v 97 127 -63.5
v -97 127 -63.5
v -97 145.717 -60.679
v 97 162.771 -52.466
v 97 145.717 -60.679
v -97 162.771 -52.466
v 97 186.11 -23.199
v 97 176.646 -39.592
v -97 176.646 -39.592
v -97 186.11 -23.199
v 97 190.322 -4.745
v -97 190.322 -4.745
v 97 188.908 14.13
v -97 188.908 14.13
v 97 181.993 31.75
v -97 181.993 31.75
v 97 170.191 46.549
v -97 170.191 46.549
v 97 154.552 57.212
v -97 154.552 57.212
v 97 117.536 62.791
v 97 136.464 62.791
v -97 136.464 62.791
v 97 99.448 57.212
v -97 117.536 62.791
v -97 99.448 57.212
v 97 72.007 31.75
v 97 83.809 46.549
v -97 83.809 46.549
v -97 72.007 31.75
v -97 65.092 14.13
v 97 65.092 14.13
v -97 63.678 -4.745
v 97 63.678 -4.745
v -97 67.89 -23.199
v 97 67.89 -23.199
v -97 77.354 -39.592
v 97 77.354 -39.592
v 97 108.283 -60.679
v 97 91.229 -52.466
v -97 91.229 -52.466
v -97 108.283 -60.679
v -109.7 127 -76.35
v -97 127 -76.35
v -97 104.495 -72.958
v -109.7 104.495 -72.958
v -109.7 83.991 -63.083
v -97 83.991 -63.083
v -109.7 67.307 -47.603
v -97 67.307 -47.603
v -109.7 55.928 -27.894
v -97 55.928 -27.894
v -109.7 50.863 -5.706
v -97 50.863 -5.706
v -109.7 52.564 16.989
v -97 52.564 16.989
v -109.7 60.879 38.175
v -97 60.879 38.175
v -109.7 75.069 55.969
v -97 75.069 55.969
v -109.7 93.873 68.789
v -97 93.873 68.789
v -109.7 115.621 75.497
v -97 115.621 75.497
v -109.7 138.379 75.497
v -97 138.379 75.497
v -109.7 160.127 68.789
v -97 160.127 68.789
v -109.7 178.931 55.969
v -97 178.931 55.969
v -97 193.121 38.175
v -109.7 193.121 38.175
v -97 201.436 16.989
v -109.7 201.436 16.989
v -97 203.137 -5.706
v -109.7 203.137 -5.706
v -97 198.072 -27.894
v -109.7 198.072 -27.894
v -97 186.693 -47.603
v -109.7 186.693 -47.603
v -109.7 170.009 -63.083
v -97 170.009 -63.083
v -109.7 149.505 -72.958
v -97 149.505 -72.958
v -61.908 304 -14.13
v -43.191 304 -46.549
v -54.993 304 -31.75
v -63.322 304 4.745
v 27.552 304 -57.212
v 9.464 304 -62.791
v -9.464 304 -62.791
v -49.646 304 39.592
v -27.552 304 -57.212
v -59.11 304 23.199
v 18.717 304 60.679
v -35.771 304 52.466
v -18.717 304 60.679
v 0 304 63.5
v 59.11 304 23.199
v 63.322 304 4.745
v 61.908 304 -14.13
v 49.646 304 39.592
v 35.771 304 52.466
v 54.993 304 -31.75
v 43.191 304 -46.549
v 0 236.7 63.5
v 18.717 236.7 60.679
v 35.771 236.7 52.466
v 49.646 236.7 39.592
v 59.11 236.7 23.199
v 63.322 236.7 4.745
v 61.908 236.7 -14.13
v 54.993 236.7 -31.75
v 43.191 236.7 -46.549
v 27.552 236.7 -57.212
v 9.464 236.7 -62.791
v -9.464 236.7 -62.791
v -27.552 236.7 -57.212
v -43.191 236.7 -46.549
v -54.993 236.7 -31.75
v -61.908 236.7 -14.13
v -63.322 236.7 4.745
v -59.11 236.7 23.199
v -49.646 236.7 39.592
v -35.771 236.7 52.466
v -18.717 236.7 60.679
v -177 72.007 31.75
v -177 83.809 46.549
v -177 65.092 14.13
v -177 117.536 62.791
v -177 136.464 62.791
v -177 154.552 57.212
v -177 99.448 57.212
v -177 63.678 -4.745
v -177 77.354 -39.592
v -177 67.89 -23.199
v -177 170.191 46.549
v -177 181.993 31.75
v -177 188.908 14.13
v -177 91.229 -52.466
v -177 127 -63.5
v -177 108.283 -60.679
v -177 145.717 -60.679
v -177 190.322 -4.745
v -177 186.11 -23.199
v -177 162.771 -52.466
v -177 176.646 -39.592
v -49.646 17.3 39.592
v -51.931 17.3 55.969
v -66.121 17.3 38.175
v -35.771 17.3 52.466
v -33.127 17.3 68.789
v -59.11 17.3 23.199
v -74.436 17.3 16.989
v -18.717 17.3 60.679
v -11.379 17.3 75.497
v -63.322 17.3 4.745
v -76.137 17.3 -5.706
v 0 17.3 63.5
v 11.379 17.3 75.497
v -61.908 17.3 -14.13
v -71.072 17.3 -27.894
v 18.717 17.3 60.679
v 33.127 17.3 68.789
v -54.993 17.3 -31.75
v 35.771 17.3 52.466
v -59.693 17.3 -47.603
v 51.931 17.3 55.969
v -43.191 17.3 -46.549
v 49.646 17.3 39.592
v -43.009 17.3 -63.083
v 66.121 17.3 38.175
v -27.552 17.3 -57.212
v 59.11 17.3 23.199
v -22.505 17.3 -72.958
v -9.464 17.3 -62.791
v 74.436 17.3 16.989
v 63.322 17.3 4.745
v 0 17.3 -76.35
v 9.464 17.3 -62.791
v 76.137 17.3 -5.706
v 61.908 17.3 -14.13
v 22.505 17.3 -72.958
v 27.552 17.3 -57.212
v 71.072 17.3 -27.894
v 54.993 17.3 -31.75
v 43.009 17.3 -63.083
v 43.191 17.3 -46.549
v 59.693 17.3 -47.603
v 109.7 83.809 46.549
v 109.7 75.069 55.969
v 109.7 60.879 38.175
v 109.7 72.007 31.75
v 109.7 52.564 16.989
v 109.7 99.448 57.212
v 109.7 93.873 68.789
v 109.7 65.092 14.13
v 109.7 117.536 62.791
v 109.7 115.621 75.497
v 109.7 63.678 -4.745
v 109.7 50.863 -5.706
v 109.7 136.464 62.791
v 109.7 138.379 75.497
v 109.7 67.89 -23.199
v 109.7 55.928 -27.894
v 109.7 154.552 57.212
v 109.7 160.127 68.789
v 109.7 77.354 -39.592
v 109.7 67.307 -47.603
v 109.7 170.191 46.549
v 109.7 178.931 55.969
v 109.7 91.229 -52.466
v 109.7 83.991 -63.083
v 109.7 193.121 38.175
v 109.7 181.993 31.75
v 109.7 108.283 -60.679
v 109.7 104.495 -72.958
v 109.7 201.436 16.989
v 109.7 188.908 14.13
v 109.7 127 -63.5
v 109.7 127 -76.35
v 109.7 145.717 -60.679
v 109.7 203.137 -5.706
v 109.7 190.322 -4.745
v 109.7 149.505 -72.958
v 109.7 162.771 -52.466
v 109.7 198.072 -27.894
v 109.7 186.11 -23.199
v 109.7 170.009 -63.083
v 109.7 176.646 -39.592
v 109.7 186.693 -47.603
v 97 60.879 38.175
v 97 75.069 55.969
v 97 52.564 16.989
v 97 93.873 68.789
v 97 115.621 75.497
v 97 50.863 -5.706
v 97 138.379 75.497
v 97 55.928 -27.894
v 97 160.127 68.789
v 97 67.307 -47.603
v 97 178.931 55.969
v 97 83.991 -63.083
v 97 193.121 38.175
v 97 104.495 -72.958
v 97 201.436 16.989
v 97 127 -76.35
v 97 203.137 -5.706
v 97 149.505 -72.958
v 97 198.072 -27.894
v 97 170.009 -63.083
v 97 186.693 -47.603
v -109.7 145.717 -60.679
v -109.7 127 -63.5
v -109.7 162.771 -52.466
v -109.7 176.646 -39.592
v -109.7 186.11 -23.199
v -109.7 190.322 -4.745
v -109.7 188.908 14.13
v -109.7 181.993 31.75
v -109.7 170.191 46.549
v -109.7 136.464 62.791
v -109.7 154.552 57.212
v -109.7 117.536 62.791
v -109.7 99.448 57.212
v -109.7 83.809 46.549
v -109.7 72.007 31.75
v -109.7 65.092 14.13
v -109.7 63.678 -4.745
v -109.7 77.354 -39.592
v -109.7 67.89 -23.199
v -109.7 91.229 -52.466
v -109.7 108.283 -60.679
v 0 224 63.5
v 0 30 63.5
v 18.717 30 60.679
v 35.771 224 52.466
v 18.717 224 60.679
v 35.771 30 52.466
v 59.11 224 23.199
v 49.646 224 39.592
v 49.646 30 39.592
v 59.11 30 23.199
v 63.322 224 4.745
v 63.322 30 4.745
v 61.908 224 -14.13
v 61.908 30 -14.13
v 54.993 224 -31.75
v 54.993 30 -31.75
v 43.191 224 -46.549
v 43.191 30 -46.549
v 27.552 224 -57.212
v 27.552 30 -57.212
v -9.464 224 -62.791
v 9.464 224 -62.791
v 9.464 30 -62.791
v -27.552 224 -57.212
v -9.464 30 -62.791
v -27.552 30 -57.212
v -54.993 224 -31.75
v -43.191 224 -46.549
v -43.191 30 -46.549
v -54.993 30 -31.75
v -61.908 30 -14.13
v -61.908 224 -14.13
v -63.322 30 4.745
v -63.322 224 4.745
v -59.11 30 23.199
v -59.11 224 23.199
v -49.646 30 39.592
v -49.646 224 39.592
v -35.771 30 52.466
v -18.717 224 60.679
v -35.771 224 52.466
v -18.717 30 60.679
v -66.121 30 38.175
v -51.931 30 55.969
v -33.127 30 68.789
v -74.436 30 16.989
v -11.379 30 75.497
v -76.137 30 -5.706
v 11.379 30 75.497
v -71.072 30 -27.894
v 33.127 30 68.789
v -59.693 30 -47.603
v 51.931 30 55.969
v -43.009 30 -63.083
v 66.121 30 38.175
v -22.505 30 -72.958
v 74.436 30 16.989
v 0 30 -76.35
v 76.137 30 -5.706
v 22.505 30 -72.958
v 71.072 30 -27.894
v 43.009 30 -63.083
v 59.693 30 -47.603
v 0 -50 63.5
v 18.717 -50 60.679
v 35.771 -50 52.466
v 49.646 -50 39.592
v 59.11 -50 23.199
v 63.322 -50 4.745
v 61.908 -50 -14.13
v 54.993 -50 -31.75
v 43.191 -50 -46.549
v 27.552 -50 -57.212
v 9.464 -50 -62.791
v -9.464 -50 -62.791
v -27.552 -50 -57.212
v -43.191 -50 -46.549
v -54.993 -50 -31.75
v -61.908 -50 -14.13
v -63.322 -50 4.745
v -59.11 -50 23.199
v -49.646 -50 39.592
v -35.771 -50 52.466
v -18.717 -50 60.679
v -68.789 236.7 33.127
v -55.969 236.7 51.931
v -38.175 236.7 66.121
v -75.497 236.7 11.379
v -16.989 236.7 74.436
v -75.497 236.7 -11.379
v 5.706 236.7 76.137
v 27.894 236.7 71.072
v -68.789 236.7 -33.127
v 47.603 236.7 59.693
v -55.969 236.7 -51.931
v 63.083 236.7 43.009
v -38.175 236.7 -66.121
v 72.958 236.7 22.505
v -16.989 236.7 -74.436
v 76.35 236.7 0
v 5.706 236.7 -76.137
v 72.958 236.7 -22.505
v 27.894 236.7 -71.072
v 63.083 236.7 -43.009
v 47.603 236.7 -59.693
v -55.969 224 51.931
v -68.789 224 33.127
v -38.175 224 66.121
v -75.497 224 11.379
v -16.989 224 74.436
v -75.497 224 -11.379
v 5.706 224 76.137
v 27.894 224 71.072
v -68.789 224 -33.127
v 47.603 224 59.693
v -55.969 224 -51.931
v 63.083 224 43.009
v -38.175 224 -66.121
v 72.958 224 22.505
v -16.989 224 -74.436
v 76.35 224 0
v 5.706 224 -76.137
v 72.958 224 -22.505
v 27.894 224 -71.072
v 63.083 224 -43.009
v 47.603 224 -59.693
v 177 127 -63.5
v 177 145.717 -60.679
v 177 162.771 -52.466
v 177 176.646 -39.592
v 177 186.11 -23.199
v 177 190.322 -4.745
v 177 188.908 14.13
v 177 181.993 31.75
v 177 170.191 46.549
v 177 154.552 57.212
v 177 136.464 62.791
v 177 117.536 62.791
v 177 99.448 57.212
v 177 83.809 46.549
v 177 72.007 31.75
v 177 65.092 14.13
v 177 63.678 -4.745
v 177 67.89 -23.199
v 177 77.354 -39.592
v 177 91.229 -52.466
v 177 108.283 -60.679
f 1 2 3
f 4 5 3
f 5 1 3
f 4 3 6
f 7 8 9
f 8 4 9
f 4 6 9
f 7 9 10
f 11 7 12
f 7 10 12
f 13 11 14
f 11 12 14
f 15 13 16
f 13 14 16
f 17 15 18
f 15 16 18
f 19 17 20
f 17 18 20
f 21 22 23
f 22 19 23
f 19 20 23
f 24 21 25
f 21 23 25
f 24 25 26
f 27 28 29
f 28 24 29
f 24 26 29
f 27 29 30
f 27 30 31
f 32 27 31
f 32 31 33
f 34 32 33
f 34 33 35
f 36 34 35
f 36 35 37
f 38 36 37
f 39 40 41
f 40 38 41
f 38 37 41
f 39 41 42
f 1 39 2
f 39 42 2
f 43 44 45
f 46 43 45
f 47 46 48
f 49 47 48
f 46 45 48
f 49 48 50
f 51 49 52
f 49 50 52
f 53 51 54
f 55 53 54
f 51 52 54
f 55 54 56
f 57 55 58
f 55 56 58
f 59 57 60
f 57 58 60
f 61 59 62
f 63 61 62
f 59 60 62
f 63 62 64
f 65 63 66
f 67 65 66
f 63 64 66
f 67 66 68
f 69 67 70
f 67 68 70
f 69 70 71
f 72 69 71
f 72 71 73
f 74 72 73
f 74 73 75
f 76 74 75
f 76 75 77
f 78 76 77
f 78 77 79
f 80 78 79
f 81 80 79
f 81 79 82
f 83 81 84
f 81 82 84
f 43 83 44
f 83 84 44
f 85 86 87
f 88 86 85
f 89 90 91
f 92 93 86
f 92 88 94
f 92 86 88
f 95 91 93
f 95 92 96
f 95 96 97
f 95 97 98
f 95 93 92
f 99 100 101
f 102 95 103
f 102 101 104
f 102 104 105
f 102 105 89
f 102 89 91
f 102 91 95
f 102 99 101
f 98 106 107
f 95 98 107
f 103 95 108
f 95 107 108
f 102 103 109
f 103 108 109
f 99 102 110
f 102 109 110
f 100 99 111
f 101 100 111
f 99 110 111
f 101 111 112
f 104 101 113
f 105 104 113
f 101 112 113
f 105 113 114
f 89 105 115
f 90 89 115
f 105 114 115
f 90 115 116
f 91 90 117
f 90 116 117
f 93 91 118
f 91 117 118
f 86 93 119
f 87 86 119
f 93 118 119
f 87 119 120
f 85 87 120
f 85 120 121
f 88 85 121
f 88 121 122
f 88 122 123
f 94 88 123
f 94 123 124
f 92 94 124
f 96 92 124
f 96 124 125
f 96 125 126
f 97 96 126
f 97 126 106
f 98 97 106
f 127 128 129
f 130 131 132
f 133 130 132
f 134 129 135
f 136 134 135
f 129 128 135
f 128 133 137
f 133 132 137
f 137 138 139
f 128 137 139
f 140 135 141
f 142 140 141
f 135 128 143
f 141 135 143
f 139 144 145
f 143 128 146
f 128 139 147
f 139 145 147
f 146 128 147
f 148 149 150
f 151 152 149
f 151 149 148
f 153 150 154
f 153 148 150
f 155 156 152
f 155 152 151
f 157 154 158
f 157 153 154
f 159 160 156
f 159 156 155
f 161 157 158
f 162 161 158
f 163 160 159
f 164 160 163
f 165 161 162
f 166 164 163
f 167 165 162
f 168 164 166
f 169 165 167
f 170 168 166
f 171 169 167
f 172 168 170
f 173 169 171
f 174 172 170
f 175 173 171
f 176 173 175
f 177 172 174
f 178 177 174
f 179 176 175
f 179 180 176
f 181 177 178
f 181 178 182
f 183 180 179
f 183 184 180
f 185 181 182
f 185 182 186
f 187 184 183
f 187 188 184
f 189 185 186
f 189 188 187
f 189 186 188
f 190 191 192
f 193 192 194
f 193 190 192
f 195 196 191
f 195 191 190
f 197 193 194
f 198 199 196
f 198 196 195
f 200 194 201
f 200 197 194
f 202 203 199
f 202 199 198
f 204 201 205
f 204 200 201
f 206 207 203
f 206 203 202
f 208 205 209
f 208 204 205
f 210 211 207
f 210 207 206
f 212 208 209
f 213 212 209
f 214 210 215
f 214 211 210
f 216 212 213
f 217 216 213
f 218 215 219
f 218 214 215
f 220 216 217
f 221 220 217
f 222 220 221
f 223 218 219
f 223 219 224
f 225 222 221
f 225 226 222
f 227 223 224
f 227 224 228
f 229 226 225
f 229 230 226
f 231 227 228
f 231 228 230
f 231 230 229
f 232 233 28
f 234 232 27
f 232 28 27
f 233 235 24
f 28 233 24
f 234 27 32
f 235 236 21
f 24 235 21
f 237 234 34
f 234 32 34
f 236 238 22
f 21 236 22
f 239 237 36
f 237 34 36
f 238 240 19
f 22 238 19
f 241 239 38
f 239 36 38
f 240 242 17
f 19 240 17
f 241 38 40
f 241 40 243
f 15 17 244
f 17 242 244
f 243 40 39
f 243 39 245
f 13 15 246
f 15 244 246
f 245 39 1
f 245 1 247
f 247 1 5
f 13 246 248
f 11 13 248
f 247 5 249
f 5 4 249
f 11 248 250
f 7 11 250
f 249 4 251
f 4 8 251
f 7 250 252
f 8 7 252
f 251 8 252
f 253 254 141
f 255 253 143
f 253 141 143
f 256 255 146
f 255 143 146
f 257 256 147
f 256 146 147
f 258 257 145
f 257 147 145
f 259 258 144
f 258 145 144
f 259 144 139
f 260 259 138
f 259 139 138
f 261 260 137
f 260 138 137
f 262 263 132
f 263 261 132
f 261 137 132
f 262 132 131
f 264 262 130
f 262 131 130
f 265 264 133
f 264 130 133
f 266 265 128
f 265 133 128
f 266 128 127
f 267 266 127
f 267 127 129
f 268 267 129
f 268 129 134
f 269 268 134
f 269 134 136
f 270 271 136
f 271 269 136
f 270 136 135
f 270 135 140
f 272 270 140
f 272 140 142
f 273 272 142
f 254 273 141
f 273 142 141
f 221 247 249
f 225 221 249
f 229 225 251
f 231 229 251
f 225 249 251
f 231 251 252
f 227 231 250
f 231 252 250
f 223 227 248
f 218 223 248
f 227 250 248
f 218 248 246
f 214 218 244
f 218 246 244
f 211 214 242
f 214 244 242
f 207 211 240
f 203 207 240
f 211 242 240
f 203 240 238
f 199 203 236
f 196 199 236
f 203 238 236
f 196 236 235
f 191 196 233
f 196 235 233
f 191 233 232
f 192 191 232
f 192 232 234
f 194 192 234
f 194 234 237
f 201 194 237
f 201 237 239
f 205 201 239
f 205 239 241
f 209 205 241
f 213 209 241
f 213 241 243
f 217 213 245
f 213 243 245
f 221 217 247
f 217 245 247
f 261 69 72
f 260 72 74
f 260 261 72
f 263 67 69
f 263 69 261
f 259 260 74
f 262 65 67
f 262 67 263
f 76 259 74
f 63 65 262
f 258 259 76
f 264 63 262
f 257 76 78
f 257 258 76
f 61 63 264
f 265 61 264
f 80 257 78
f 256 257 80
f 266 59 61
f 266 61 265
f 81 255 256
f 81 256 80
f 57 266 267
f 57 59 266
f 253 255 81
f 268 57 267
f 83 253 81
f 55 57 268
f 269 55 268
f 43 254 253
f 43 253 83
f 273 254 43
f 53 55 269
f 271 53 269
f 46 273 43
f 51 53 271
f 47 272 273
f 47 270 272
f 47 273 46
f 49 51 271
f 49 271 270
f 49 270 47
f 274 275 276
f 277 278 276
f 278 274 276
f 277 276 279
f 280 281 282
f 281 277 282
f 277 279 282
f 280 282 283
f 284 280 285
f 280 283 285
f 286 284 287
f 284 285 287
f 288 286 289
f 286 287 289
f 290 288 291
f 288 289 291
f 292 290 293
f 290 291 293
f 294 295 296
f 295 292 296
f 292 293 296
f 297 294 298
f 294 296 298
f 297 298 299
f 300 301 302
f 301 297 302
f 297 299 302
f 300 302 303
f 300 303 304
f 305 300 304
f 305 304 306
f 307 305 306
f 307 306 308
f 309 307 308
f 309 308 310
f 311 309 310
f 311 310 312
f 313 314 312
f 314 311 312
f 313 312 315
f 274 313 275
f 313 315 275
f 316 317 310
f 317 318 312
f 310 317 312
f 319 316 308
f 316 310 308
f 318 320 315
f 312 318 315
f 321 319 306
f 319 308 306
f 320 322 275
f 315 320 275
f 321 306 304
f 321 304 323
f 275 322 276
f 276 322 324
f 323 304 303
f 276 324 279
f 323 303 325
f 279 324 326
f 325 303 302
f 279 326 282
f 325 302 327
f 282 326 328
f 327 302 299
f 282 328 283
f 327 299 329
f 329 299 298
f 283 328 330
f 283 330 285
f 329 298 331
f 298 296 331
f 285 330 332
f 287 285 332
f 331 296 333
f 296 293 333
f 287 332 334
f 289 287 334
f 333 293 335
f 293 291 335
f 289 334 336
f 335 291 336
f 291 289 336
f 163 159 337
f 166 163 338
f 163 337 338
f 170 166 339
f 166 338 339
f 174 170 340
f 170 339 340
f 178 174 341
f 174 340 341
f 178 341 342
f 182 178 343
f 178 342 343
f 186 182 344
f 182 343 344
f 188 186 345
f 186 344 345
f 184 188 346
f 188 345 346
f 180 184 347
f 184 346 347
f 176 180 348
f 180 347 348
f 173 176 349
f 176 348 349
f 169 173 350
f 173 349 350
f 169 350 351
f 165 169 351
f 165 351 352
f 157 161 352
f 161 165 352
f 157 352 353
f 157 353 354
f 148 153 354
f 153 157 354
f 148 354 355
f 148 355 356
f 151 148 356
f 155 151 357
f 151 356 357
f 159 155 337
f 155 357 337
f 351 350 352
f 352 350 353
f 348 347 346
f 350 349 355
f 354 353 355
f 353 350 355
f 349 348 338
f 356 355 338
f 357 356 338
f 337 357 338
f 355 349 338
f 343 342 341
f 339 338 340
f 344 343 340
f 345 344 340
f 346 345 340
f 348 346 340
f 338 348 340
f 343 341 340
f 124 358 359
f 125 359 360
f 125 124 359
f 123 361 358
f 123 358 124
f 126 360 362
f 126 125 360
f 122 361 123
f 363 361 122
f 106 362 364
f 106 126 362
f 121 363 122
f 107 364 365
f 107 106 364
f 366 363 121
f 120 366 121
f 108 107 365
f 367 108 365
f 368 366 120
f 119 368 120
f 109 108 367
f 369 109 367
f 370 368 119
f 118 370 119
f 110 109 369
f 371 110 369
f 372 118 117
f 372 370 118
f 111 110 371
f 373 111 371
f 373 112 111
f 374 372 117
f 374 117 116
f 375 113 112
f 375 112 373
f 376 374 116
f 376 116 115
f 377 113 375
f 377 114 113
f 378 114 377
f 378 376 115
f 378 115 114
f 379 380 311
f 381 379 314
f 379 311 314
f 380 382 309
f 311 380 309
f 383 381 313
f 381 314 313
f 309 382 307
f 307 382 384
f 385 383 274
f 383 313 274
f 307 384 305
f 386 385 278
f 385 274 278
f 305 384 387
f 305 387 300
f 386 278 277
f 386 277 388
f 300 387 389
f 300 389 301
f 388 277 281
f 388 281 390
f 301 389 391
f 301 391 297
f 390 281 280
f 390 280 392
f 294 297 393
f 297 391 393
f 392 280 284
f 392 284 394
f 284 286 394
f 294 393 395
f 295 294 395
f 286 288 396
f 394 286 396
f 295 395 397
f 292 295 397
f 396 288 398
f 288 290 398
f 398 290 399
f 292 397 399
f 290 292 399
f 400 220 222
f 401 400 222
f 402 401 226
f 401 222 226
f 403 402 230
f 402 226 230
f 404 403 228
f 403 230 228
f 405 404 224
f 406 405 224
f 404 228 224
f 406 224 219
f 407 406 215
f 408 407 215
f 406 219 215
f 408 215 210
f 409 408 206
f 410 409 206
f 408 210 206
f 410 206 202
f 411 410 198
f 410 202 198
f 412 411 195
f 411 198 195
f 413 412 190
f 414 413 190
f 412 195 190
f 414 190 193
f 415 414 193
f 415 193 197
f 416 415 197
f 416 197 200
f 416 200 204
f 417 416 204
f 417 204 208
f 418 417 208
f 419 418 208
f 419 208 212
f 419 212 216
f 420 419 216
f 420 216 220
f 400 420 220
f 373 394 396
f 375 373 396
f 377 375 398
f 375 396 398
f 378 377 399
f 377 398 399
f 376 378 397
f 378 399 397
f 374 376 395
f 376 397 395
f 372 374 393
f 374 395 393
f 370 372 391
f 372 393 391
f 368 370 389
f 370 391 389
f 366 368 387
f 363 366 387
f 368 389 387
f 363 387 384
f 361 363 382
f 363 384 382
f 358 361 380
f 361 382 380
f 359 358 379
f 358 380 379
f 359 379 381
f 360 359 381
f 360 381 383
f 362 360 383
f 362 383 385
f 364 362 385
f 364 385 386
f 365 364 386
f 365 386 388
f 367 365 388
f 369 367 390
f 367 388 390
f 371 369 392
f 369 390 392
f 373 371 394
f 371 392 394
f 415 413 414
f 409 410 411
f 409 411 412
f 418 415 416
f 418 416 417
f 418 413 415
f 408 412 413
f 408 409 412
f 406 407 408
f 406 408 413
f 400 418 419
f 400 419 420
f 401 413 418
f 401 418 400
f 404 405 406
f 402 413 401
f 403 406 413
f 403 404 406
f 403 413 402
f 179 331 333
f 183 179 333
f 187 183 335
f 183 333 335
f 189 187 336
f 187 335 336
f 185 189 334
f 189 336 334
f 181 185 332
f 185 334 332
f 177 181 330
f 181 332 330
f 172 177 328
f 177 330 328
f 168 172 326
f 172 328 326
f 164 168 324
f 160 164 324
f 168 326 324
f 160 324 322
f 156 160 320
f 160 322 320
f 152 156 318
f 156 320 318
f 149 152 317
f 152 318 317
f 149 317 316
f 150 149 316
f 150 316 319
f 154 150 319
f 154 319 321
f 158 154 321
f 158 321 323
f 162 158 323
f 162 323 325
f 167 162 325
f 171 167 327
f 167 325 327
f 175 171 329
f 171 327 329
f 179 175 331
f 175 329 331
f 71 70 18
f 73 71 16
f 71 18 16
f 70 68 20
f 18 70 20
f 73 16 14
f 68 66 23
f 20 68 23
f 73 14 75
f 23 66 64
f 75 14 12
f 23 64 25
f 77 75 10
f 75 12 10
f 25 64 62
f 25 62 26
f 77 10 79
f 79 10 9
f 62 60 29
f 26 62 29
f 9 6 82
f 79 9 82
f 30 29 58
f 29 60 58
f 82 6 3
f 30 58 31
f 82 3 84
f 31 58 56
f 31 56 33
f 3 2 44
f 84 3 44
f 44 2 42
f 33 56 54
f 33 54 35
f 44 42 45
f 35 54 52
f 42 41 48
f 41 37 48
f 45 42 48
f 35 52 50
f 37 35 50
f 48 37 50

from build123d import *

# Parameters (mm, degrees)
BOSS_EXTRUDE1_DEPTH      = 304
BOSS_EXTRUDE1_DEPTH_BACK = 50
SKETCH1_R                = 63.5
BOSS_EXTRUDE2_DEPTH      = 177
BOSS_EXTRUDE2_DEPTH_BACK = 177
BOSS_EXTRUDE3_START      = -80
SKETCH5_R                = 76.35
SKETCH5_R_2              = 63.5
BOSS_EXTRUDE3_DEPTH      = 12.7
BOSS_EXTRUDE4_START      = -80
SKETCH6_R                = 76.35
BOSS_EXTRUDE4_DEPTH      = 12.7
BOSS_EXTRUDE5_START      = -80
SKETCH7_R                = 76.35
SKETCH7_R_2              = 63.5
BOSS_EXTRUDE5_DEPTH      = 12.7
BOSS_EXTRUDE6_START      = -67.3
SKETCH8_R                = 76.35
BOSS_EXTRUDE6_DEPTH      = 12.7


with BuildPart() as part:
    # Sketch1 → Boss-Extrude1 (new, two sides: drawn at the far end of the back side and taken through both)
    with BuildSketch(Plane(origin=(0, 0, 0), x_dir=(1, 0, 0), z_dir=(0, 1, 0)).offset(-BOSS_EXTRUDE1_DEPTH_BACK)):
        Circle(SKETCH1_R)
    extrude(amount=BOSS_EXTRUDE1_DEPTH + BOSS_EXTRUDE1_DEPTH_BACK)

    # Sketch6 → Boss-Extrude4 (add)
    with BuildSketch(Plane.XZ.offset(50).offset(BOSS_EXTRUDE4_START)):
        Circle(SKETCH6_R)
    extrude(amount=BOSS_EXTRUDE4_DEPTH)

    # Sketch8 → Boss-Extrude6 (add)
    with BuildSketch(Plane(origin=(0, 304, 0), x_dir=(1, 0, 0), z_dir=(0, 1, 0)).offset(BOSS_EXTRUDE6_START)):
        Circle(SKETCH8_R)
    extrude(amount=-BOSS_EXTRUDE6_DEPTH)


with BuildPart() as body_2:
    # Sketch3 → Boss-Extrude2 (new, two sides: drawn at the far end of the back side and taken through both)
    with BuildSketch(Plane(origin=(0, 0, 0), x_dir=(0, 0, -1), z_dir=(1, 0, 0)).offset(-BOSS_EXTRUDE2_DEPTH_BACK)):
        with BuildLine():
            ThreePointArc((0, 63.5), (44.901280605, 82.098719395), (63.5, 127))
            ThreePointArc((63.5, 127), (-44.901280605, 171.901280605), (0, 63.5))
        make_face()
    extrude(amount=BOSS_EXTRUDE2_DEPTH + BOSS_EXTRUDE2_DEPTH_BACK)

    # Sketch5 → Boss-Extrude3 (add)
    with BuildSketch(Plane(origin=(177, 0, 0), x_dir=(0, 0, -1), z_dir=(1, 0, 0)).offset(BOSS_EXTRUDE3_START)):
        with Locations((0, 127)):
            Circle(SKETCH5_R)
        with Locations((0, 127)):
            Circle(SKETCH5_R_2, mode=Mode.SUBTRACT)
    extrude(amount=BOSS_EXTRUDE3_DEPTH)

    # Sketch7 → Boss-Extrude5 (add)
    with BuildSketch(Plane.ZY.offset(177).offset(BOSS_EXTRUDE5_START)):
        with Locations((0, 127)):
            Circle(SKETCH7_R)
        with Locations((0, 127)):
            Circle(SKETCH7_R_2, mode=Mode.SUBTRACT)
    extrude(amount=BOSS_EXTRUDE5_DEPTH)


solid = Compound([part.part, body_2.part])
